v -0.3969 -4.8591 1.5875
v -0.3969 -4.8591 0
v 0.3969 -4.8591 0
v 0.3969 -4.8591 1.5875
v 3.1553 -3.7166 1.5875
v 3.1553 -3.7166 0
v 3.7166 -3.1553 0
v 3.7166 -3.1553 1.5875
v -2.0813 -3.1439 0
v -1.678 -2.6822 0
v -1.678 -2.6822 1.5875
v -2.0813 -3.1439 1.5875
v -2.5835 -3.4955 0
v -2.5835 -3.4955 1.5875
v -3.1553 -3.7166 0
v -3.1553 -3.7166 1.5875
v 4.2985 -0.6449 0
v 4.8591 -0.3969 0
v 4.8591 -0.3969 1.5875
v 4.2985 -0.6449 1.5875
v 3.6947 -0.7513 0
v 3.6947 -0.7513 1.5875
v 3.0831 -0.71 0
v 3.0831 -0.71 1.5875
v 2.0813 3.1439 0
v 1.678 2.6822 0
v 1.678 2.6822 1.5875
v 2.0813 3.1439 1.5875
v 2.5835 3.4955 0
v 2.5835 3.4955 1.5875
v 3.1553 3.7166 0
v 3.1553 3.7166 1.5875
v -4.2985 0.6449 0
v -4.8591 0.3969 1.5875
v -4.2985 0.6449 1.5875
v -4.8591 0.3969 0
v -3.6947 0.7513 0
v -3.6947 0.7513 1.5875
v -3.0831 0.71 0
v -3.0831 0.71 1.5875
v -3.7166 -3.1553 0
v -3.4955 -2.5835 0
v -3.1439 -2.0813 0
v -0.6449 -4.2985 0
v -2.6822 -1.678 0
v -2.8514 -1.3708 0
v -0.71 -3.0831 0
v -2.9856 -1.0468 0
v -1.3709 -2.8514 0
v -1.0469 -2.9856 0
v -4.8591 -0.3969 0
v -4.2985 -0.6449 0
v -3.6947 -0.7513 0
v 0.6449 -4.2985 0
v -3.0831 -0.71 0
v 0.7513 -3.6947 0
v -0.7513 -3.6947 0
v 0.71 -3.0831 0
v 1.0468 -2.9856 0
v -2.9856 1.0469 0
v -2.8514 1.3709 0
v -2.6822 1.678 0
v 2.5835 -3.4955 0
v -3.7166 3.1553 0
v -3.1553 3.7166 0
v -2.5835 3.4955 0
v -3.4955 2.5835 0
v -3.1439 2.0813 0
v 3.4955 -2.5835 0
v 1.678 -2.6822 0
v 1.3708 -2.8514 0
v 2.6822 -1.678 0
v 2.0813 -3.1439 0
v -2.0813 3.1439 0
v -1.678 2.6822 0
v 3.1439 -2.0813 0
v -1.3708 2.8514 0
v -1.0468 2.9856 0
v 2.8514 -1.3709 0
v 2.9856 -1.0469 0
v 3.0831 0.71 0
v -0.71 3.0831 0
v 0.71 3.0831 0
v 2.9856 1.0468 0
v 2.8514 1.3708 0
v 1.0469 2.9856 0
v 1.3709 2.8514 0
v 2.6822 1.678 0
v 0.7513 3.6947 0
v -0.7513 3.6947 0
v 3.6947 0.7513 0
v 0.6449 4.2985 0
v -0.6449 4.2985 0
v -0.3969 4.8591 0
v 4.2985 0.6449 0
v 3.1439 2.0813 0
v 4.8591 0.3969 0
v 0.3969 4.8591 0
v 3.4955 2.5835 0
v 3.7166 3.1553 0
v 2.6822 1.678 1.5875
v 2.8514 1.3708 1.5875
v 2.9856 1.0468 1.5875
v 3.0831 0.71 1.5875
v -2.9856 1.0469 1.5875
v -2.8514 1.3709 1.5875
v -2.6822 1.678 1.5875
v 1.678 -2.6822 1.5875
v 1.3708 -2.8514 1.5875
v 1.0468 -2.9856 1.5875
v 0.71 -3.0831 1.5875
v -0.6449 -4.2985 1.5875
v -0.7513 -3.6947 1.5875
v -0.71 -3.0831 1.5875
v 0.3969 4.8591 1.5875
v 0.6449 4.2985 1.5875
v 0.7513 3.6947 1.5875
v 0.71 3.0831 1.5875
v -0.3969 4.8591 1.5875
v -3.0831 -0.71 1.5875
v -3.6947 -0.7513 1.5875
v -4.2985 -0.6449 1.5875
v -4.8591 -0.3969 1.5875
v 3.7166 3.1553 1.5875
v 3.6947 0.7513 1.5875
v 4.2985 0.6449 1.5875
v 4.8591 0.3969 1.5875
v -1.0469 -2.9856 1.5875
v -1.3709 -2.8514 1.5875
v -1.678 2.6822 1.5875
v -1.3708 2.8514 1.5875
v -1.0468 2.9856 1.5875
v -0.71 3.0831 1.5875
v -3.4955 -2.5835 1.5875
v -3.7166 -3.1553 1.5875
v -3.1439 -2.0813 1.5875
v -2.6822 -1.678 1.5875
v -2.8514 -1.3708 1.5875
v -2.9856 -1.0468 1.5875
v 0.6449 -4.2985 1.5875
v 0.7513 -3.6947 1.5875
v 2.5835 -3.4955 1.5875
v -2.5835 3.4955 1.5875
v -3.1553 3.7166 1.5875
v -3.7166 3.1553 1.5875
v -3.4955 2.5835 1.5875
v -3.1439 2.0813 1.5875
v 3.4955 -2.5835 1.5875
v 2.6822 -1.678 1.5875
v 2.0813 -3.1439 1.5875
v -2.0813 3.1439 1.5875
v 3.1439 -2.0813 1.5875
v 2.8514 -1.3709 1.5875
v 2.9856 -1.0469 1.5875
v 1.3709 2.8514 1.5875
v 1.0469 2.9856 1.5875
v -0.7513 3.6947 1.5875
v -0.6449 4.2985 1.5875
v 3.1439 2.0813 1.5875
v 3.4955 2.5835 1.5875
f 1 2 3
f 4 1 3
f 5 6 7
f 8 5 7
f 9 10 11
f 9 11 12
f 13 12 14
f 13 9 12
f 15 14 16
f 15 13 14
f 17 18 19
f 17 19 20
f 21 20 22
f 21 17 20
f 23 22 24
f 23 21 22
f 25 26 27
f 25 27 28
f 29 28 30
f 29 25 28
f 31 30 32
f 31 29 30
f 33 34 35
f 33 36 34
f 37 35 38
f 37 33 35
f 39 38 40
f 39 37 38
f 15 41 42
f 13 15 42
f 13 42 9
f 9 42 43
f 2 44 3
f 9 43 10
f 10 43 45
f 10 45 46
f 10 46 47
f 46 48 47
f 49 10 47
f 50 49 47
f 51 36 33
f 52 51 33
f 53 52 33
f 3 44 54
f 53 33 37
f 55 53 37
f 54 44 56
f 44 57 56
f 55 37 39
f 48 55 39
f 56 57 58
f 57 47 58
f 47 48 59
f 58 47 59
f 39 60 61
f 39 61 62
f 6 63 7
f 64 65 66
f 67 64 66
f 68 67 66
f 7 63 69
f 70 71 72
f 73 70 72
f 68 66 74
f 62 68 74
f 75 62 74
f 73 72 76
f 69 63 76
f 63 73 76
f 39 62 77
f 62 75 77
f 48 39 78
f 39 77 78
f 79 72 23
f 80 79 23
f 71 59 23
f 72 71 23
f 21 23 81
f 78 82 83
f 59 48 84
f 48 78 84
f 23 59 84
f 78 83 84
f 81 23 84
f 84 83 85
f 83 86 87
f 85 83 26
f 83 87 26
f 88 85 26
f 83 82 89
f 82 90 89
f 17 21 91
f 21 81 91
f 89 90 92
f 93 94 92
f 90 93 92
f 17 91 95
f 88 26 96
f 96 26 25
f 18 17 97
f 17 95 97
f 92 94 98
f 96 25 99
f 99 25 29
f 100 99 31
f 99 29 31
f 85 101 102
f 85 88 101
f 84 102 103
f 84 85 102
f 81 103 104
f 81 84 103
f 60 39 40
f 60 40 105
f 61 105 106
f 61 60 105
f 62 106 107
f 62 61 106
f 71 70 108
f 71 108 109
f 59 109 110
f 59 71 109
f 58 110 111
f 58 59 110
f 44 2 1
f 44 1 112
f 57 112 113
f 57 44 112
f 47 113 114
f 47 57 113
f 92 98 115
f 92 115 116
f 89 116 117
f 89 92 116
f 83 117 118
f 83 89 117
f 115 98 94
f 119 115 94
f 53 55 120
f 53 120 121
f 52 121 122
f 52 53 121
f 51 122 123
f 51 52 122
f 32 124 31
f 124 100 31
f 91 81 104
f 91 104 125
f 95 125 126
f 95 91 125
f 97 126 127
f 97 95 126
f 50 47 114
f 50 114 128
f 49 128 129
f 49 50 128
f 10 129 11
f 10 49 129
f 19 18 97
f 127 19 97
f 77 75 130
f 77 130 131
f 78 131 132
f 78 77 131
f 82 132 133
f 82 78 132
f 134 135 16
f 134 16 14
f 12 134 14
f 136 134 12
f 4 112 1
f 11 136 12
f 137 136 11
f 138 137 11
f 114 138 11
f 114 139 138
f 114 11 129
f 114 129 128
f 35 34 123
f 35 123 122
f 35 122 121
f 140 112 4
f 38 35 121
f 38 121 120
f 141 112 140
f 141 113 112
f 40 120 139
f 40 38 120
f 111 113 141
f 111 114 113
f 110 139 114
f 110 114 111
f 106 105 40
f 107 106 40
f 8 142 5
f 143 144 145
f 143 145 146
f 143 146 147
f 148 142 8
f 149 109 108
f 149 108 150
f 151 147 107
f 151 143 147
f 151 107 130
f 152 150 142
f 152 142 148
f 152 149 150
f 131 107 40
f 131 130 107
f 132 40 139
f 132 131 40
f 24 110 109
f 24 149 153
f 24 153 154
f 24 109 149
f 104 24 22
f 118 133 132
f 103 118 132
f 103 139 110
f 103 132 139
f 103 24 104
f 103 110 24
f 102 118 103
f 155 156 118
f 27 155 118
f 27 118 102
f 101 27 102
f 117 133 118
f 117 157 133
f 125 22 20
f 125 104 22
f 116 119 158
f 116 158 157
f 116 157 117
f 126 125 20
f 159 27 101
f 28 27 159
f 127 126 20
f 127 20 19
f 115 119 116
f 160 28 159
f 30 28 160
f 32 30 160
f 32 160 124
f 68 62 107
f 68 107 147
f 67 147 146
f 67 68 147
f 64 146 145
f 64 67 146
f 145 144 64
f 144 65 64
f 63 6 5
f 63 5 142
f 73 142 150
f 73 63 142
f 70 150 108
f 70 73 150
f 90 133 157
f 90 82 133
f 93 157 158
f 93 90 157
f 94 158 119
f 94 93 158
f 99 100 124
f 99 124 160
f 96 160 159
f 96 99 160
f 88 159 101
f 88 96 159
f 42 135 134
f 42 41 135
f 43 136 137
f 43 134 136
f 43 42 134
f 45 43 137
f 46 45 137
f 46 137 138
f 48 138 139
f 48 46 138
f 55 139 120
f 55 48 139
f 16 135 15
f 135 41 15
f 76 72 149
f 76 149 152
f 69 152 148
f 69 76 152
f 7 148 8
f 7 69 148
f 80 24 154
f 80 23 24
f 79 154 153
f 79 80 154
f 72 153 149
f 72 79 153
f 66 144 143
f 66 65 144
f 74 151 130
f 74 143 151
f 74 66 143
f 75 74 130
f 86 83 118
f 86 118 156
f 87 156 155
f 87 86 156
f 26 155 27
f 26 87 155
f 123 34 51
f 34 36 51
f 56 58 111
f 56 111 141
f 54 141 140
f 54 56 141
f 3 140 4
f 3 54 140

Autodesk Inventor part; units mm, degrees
ref_plane "YZ Plane" through (0, 0, 0) normal (1, 0, 0) x (0, 1, 0)
ref_plane "XZ Plane" through (0, 0, 0) normal (0, 1, 0) x (-1, 0, 0)
ref_plane "XY Plane" through (0, 0, 0) normal (0, 0, 1) x (1, 0, 0)
sketch "Sketch2" plane through (0, 0, 0) normal (0, 0, 1) x (1, 0, 0)
  line L0 (0, 0) -> (0, 8.357) construction
  line L1 (0, 0) -> (2.8603, 0) construction
  arc A0 (-0.3969, 4.8591) -> (-0.71, 3.0831) centre (1.785, 3.5588) ccw
  arc A1 (0.71, 3.0831) -> (0.3969, 4.8591) centre (-1.785, 3.5588) ccw
  line L2 (0.3969, 4.8591) -> (-0.3969, 4.8591)
  line L3 (-0.71, 3.0831) -> (0.71, 3.0831) construction
  arc A2 (0.71, 3.0831) -> (0.3969, 4.8591) centre (-1.785, 3.5588) ccw
  line L4 (0.3969, 4.8591) -> (-0.3969, 4.8591)
  arc A3 (-0.3969, 4.8591) -> (-0.71, 3.0831) centre (1.785, 3.5588) ccw
  line L5 (0.3969, 4.8591) -> (0.71, 3.0831) construction
  arc A4 (-1.678, 2.6822) -> (-3.1553, 3.7166) centre (-3.7786, 1.2542) ccw
  line L6 (-3.1553, 3.7166) -> (-3.7166, 3.1553)
  arc A5 (-3.7166, 3.1553) -> (-2.6822, 1.678) centre (-1.2542, 3.7786) ccw
  arc A6 (-3.0831, 0.71) -> (-4.8591, 0.3969) centre (-3.5588, -1.785) ccw
  line L7 (-4.8591, 0.3969) -> (-4.8591, -0.3969)
  arc A7 (-4.8591, -0.3969) -> (-3.0831, -0.71) centre (-3.5588, 1.785) ccw
  arc A8 (-2.6822, -1.678) -> (-3.7166, -3.1553) centre (-1.2542, -3.7786) ccw
  line L8 (-3.7166, -3.1553) -> (-3.1553, -3.7166)
  arc A9 (-3.1553, -3.7166) -> (-1.678, -2.6822) centre (-3.7786, -1.2542) ccw
  arc A10 (-0.71, -3.0831) -> (-0.3969, -4.8591) centre (1.785, -3.5588) ccw
  line L9 (-0.3969, -4.8591) -> (0.3969, -4.8591)
  arc A11 (0.3969, -4.8591) -> (0.71, -3.0831) centre (-1.785, -3.5588) ccw
  arc A12 (1.678, -2.6822) -> (3.1553, -3.7166) centre (3.7786, -1.2542) ccw
  line L10 (3.1553, -3.7166) -> (3.7166, -3.1553)
  arc A13 (3.7166, -3.1553) -> (2.6822, -1.678) centre (1.2542, -3.7786) ccw
  arc A14 (3.0831, -0.71) -> (4.8591, -0.3969) centre (3.5588, 1.785) ccw
  line L11 (4.8591, -0.3969) -> (4.8591, 0.3969)
  arc A15 (4.8591, 0.3969) -> (3.0831, 0.71) centre (3.5588, -1.785) ccw
  arc A16 (2.6822, 1.678) -> (3.7166, 3.1553) centre (1.2542, 3.7786) ccw
  line L12 (3.7166, 3.1553) -> (3.1553, 3.7166)
  arc A17 (3.1553, 3.7166) -> (1.678, 2.6822) centre (3.7786, 1.2542) ccw
  line L13 (-1.678, 2.6822) -> (-0.71, 3.0831) construction
  arc A18 (-0.71, 3.0831) -> (-1.678, 2.6822) centre (0, 0) ccw
  arc A19 (1.678, 2.6822) -> (0.71, 3.0831) centre (0, 0) ccw
  arc A20 (3.0831, 0.71) -> (2.6822, 1.678) centre (0, 0) ccw
  arc A21 (2.6822, -1.678) -> (3.0831, -0.71) centre (0, 0) ccw
  arc A22 (0.71, -3.0831) -> (1.678, -2.6822) centre (0, 0) ccw
  arc A23 (-1.678, -2.6822) -> (-0.71, -3.0831) centre (0, 0) ccw
  arc A24 (-2.6822, 1.678) -> (-3.0831, 0.71) centre (0, 0) ccw
  arc A25 (-3.0831, -0.71) -> (-2.6822, -1.678) centre (0, 0) ccw
  point P0 (0, 4.8591)
  point P1 (-3.4359, 3.4359)
  point P2 (-4.8591, 0)
  point P3 (-3.4359, -3.4359)
  point P4 (0, -4.8591)
  point P5 (3.4359, -3.4359)
  point P6 (4.8591, 0)
  point P7 (3.4359, 3.4359)
  dimension "d11" = 0.7937
  dimension "d13" = 2.54
  dimension "d14" = 80
  dimension "d15" = 1.8034
  dimension "d18" = 360
  dimension "d20" = 1.0477
extrude "Extrusion2" add sketch "Sketch2" along normal blind 1.5875
properties part number "Planet"
